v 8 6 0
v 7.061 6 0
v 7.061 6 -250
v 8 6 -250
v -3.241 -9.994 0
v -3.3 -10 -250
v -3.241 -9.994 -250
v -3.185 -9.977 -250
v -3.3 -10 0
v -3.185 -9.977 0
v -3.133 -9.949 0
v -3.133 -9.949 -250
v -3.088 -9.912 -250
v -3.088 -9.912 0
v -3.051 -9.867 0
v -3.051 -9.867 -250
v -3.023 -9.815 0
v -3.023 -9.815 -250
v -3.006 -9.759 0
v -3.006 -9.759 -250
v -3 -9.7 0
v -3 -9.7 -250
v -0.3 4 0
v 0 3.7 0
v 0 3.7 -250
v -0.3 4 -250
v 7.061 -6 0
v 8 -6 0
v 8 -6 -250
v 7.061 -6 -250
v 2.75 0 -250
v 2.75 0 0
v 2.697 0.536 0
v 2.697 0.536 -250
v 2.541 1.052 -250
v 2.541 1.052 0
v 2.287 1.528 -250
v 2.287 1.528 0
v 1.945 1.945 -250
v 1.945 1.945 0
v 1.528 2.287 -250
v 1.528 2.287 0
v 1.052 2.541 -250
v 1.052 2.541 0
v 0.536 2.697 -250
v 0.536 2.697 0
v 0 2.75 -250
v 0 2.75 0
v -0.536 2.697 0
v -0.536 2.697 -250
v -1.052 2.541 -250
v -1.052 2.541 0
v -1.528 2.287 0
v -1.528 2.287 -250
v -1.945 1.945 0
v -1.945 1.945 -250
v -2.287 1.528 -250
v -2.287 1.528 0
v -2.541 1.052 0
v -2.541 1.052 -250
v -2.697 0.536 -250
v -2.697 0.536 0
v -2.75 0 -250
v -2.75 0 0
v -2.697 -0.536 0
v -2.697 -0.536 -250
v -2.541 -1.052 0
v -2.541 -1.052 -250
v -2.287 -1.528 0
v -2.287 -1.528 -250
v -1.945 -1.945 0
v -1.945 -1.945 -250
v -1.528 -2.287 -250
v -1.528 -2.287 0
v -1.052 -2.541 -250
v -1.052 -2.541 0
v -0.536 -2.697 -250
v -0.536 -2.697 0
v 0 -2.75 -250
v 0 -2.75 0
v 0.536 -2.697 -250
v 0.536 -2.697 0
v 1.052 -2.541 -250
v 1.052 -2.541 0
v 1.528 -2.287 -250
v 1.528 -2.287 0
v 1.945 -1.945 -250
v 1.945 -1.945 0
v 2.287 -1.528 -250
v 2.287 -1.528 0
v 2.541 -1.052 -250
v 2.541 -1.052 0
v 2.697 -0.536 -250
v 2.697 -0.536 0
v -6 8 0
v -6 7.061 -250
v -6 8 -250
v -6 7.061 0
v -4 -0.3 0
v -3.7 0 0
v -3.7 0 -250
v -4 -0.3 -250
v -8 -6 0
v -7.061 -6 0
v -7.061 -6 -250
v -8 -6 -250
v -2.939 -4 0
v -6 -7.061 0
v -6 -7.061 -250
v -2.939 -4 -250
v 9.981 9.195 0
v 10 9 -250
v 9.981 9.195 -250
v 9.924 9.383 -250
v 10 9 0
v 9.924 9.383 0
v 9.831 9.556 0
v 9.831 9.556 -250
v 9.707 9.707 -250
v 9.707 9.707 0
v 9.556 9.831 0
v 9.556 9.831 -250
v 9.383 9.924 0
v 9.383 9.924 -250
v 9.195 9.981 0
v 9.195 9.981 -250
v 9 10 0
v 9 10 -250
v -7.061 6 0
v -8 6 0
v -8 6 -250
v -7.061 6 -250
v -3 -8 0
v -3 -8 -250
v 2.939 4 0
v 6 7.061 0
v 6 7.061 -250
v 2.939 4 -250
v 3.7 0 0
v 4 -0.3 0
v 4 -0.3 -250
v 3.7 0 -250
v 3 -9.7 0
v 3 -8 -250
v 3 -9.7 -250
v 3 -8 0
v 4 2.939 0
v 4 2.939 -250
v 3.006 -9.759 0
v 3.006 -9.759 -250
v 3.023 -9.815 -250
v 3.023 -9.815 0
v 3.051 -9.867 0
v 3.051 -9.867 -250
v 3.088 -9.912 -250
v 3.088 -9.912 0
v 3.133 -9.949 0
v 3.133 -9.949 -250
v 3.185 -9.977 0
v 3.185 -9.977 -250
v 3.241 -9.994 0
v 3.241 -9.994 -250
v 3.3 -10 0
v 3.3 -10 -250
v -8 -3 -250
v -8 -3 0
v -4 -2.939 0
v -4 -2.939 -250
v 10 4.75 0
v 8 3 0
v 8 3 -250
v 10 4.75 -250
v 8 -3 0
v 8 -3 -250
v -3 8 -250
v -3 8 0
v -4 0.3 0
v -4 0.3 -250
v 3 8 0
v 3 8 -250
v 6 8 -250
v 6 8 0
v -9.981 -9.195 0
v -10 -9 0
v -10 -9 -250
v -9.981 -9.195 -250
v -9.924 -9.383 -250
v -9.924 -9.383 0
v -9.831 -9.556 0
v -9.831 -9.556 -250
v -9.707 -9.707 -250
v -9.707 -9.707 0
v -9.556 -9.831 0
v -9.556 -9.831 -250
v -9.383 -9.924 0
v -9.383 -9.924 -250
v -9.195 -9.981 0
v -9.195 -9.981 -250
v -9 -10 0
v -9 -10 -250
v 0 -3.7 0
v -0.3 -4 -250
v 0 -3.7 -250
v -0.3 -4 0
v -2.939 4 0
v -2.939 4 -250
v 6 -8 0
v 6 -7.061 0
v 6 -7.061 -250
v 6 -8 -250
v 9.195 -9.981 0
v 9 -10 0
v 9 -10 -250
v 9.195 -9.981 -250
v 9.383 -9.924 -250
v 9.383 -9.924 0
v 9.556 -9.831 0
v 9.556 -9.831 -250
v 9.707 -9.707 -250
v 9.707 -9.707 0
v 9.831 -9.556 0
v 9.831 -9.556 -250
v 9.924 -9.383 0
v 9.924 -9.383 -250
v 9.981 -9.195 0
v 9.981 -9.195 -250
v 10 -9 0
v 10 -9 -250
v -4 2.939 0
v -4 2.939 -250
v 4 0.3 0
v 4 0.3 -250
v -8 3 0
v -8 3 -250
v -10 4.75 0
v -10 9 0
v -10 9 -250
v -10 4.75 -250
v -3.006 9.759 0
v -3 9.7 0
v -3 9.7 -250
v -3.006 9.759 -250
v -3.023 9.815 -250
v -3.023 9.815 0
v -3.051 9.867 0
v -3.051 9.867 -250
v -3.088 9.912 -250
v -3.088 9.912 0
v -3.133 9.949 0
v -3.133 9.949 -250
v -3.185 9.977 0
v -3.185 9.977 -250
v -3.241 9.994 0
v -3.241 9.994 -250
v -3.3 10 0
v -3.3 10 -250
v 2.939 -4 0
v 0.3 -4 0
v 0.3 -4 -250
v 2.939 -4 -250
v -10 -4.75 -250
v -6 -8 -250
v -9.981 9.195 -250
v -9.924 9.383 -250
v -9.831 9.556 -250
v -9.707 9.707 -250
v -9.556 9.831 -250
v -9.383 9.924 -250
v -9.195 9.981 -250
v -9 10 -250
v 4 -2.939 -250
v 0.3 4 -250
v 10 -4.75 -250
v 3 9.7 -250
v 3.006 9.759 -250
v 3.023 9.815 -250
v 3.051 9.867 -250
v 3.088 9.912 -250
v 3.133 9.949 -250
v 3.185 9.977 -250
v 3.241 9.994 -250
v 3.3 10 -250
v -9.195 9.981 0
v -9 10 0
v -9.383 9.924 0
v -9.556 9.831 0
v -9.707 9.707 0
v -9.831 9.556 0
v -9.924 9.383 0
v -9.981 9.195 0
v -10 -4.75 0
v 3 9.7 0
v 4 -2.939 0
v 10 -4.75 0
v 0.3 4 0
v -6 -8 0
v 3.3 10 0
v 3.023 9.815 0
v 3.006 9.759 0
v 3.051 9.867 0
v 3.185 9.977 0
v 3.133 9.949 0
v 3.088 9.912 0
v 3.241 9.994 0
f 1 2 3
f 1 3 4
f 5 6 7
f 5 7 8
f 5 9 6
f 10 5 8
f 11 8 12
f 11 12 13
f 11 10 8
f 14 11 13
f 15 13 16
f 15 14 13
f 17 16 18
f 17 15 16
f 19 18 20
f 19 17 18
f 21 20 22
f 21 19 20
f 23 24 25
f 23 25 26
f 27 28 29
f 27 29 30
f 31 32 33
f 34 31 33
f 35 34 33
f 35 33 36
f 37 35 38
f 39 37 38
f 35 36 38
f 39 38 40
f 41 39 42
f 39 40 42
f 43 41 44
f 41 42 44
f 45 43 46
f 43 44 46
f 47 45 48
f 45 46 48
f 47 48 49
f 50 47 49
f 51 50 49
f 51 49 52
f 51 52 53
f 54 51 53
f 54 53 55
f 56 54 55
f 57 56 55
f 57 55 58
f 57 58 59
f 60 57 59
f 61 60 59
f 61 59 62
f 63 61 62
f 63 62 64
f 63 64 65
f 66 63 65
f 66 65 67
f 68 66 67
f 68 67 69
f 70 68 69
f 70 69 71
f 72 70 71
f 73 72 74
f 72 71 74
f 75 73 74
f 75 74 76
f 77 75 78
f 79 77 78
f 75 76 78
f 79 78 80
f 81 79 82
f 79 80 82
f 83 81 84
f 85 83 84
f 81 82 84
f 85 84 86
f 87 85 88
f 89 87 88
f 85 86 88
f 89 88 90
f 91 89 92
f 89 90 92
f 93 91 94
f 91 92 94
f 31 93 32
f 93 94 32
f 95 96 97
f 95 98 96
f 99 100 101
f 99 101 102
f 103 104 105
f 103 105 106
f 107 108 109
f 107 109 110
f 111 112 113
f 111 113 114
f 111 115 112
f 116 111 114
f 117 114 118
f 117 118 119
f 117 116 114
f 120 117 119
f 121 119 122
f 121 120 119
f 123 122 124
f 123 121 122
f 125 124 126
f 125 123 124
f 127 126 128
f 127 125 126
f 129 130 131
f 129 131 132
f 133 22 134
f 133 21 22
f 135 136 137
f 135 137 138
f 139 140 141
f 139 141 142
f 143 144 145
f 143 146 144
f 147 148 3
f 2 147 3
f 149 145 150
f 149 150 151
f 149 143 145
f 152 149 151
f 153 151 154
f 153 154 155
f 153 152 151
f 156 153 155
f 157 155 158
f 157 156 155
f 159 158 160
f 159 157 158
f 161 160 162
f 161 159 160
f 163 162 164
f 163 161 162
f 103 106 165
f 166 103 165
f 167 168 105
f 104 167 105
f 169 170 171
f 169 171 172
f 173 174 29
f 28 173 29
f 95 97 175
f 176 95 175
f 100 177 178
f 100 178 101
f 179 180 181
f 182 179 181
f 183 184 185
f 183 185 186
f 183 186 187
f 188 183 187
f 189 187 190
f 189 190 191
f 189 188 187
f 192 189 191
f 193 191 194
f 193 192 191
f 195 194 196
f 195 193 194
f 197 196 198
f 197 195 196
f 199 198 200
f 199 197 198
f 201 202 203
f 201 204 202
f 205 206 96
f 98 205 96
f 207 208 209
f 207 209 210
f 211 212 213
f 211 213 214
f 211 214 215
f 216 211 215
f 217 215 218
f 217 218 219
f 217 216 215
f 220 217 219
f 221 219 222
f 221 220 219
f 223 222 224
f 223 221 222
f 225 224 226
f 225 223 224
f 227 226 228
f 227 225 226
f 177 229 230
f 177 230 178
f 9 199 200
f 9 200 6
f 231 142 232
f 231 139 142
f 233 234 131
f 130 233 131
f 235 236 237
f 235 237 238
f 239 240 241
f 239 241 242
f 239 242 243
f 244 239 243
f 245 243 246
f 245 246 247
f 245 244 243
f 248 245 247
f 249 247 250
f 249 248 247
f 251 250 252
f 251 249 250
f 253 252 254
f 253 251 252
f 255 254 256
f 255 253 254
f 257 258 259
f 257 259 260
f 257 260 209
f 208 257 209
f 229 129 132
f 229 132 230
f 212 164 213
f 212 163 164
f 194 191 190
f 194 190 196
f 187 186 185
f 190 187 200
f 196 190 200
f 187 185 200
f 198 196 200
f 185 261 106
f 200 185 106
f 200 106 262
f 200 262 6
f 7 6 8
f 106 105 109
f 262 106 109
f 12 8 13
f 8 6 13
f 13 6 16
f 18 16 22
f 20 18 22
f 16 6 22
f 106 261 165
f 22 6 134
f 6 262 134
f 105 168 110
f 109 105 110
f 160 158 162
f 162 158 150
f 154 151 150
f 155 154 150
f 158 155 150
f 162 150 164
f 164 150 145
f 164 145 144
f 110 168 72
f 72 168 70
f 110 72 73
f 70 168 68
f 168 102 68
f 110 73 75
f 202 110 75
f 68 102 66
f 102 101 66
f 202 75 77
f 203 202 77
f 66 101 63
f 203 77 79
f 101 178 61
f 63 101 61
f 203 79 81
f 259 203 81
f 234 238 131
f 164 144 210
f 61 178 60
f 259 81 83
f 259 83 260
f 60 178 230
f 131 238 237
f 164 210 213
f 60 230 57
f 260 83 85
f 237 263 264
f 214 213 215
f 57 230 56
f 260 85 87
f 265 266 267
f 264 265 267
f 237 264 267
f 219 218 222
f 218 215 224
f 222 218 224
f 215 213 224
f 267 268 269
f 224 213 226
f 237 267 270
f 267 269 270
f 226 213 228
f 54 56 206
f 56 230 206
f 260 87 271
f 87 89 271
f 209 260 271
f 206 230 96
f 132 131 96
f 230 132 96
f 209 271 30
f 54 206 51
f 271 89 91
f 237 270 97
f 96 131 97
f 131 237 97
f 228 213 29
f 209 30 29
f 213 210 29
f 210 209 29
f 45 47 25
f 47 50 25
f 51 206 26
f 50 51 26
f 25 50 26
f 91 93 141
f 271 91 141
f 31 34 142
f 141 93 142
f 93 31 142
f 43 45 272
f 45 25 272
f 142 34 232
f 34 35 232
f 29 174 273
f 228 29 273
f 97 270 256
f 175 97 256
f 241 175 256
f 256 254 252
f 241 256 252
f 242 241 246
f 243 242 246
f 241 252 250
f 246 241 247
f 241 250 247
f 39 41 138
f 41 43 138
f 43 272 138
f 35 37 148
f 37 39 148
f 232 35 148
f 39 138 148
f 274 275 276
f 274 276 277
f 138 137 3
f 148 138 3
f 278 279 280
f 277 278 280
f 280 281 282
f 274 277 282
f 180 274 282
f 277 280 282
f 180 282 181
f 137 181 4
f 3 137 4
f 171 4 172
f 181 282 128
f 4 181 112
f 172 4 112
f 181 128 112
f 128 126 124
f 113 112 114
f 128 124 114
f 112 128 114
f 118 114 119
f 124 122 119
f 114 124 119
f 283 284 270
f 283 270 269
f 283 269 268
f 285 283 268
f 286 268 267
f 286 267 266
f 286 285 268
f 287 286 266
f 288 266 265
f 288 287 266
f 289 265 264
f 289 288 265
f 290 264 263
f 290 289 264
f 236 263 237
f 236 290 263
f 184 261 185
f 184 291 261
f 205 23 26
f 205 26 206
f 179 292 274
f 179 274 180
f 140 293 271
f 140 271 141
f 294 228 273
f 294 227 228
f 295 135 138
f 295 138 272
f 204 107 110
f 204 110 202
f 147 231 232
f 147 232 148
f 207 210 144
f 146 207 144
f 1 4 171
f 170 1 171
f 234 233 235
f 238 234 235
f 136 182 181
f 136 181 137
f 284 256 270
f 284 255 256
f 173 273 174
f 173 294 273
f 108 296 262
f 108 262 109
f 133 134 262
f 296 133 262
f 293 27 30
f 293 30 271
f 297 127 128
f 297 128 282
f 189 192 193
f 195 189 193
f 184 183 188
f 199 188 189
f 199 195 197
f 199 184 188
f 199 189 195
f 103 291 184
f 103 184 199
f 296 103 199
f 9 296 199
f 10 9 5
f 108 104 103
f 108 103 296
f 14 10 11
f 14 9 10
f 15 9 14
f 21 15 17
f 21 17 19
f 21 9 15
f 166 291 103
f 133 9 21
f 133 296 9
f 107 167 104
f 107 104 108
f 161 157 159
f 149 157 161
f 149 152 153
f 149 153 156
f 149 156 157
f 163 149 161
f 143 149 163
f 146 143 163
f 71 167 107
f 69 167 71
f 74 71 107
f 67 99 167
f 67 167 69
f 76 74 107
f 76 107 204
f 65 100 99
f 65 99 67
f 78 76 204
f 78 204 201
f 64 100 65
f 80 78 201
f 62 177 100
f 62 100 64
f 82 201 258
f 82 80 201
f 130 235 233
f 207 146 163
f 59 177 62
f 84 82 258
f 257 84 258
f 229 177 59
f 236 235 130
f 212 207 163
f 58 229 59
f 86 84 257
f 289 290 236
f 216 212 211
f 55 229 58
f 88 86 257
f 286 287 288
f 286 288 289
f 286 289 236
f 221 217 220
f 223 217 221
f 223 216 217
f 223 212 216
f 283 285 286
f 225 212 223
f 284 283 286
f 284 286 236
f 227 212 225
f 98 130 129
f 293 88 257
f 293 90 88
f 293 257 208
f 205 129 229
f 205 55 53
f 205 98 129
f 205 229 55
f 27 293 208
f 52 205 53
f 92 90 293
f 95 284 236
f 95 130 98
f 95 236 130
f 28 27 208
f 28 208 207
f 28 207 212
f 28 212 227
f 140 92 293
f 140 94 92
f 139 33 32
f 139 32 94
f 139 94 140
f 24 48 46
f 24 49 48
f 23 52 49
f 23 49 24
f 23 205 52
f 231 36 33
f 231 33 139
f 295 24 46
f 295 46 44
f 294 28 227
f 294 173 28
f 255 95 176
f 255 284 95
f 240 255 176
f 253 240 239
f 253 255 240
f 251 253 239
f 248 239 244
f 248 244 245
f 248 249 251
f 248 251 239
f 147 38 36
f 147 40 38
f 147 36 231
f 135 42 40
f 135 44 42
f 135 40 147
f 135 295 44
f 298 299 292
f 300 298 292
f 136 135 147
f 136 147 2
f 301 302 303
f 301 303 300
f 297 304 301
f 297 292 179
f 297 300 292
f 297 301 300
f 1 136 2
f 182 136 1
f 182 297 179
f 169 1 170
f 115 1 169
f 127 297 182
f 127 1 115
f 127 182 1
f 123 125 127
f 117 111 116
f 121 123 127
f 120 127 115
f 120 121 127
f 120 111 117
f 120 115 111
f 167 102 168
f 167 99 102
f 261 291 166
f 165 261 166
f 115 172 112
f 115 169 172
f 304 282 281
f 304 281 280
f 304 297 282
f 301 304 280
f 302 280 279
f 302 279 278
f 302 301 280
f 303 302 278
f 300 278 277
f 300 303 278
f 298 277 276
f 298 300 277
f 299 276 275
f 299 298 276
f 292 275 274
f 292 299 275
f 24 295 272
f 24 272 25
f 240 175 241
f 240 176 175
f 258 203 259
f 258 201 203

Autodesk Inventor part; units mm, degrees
ref_plane "YZ Plane" through (0, 0, 0) normal (1, 0, 0) x (0, 1, 0)
ref_plane "XZ Plane" through (0, 0, 0) normal (0, 1, 0) x (-1, 0, 0)
ref_plane "XY Plane" through (0, 0, 0) normal (0, 0, 1) x (1, 0, 0)
sketch "Sketch_5" plane through (0, 0, 0) normal (0, 0, 1) x (1, 0, 0)
  line L0 (-10, 9) -> (-10, 3.3)
  arc A0 (-10, 3.3) -> (-9.7, 3) centre (-9.7, 3.3) ccw
  line L1 (-9.7, 3) -> (-8, 3)
  line L2 (-8, 3) -> (-8, 6)
  line L3 (-8, 6) -> (-7.0607, 6)
  line L4 (-7.0607, 6) -> (-4, 2.9393)
  line L5 (-4, 2.9393) -> (-4, 0.3)
  line L6 (-4, 0.3) -> (-3.7, 0)
  line L7 (-3.7, 0) -> (-4, -0.3)
  line L8 (-4, -0.3) -> (-4, -2.9393)
  line L9 (-4, -2.9393) -> (-7.0607, -6)
  line L10 (-7.0607, -6) -> (-8, -6)
  line L11 (-8, -6) -> (-8, -3)
  line L12 (-8, -3) -> (-9.7, -3)
  arc A1 (-9.7, -3) -> (-10, -3.3) centre (-9.7, -3.3) ccw
  line L13 (-10, -3.3) -> (-10, -9)
  arc A2 (-10, -9) -> (-9, -10) centre (-9, -9) ccw
  line L14 (-9, -10) -> (-3.3, -10)
  arc A3 (-3.3, -10) -> (-3, -9.7) centre (-3.3, -9.7) ccw
  line L15 (-3, -9.7) -> (-3, -8)
  line L16 (-3, -8) -> (-6, -8)
  line L17 (-6, -8) -> (-6, -7.0607)
  line L18 (-6, -7.0607) -> (-2.9393, -4)
  line L19 (-2.9393, -4) -> (-0.3, -4)
  line L20 (-0.3, -4) -> (0, -3.7)
  line L21 (0, -3.7) -> (0.3, -4)
  line L22 (0.3, -4) -> (2.9393, -4)
  line L23 (2.9393, -4) -> (6, -7.0607)
  line L24 (6, -7.0607) -> (6, -8)
  line L25 (6, -8) -> (3, -8)
  line L26 (3, -8) -> (3, -9.7)
  arc A4 (3, -9.7) -> (3.3, -10) centre (3.3, -9.7) ccw
  line L27 (3.3, -10) -> (9, -10)
  arc A5 (9, -10) -> (10, -9) centre (9, -9) ccw
  line L28 (10, -9) -> (10, -3.3)
  arc A6 (10, -3.3) -> (9.7, -3) centre (9.7, -3.3) ccw
  line L29 (9.7, -3) -> (8, -3)
  line L30 (8, -3) -> (8, -6)
  line L31 (8, -6) -> (7.0607, -6)
  line L32 (7.0607, -6) -> (4, -2.9393)
  line L33 (4, -2.9393) -> (4, -0.3)
  line L34 (4, -0.3) -> (3.7, 0)
  line L35 (3.7, 0) -> (4, 0.3)
  line L36 (4, 0.3) -> (4, 2.9393)
  line L37 (4, 2.9393) -> (7.0607, 6)
  line L38 (7.0607, 6) -> (8, 6)
  line L39 (8, 6) -> (8, 3)
  line L40 (8, 3) -> (9.7, 3)
  arc A7 (9.7, 3) -> (10, 3.3) centre (9.7, 3.3) ccw
  line L41 (10, 3.3) -> (10, 9)
  arc A8 (10, 9) -> (9, 10) centre (9, 9) ccw
  line L42 (9, 10) -> (3.3, 10)
  arc A9 (3.3, 10) -> (3, 9.7) centre (3.3, 9.7) ccw
  line L43 (3, 9.7) -> (3, 8)
  line L44 (3, 8) -> (6, 8)
  line L45 (6, 8) -> (6, 7.0607)
  line L46 (6, 7.0607) -> (2.9393, 4)
  line L47 (2.9393, 4) -> (0.3, 4)
  line L48 (0.3, 4) -> (0, 3.7)
  line L49 (0, 3.7) -> (-0.3, 4)
  line L50 (-0.3, 4) -> (-2.9393, 4)
  line L51 (-2.9393, 4) -> (-6, 7.0607)
  line L52 (-6, 7.0607) -> (-6, 8)
  line L53 (-6, 8) -> (-3, 8)
  line L54 (-3, 8) -> (-3, 9.7)
  arc A10 (-3, 9.7) -> (-3.3, 10) centre (-3.3, 9.7) ccw
  line L55 (-3.3, 10) -> (-9, 10)
  arc A11 (-9, 10) -> (-10, 9) centre (-9, 9) ccw
  circle A12 centre (0, 0) radius 2.75
  line L56 (-8, 3) -> (-10, 4.75)
  line L57 (-10, -4.75) -> (-8, -3)
  line L58 (8, 3) -> (10, 4.75)
  line L59 (10, -4.75) -> (8, -3)
  dimension "d2" = 5.5
  dimension "d3" = 10
  dimension "d4" = 10
  dimension "d5" = 5.7
  dimension "d6" = 5.7
  dimension "d7" = 1.7
  dimension "d8" = 3
  dimension "d9" = 0.3
  dimension "d10" = 90
  dimension "d11" = 45
  dimension "d12" = 45
  dimension "d13" = 45
  dimension "d14" = 90
  dimension "d15" = 90
  dimension "d16" = 45
  dimension "d17" = 45
  dimension "d18" = 45
  dimension "d19" = 45
  dimension "d20" = 90
  dimension "d21" = 90
  dimension "d22" = 45
  dimension "d23" = 45
  dimension "d24" = 90
  dimension "d25" = 90
  dimension "d26" = 90
  dimension "d27" = 90
  dimension "d28" = 90
  dimension "d29" = 90
  dimension "d30" = 90
  dimension "d31" = 90
  dimension "d32" = 90
  dimension "d33" = 90
  dimension "d34" = 90
  dimension "d35" = 90
  dimension "d36" = 90
  dimension "d37" = 90
  dimension "d38" = 90
  dimension "d39" = 4
  dimension "d40" = 6
  dimension "d41" = 13
  dimension "d42" = 14
  dimension "d43" = 16
  dimension "d44" = 18
  dimension "d45" = 3
  dimension "d46" = 9
  dimension "d47" = 7
  dimension "d48" = 1
  dimension "d49" = 7
  dimension "d50" = 1.5
  dimension "d51" = 1.8663
  dimension "d52" = 3.3663
  dimension "d53" = 1.5
  dimension "d54" = 1.8663
  dimension "d55" = 3.3663
  dimension "d56" = 4
  dimension "d57" = 10.8187
  dimension "d58" = 1.9092
  dimension "d59" = 5
  dimension "d60" = 13
  dimension "d61" = 13
  dimension "d62" = 16.0513
  dimension "d63" = 3.3234
  dimension "d64" = 14
  dimension "d65" = 12.685
extrude "Extrusion1" add sketch "Sketch_5" against normal blind 250 contours A11 L55 A10 L54 L53 L52 L51 L50 L49 L48 L47 L46 L45 L44 L43 A9 L42 A8 L41 L58 L39 L38 L37 L36 L35 L34 L33 L32 L31 L30 L59 L28 A5 L27 A4 L26 L25 L24 L23 L22 L21 L20 L19 L18 L17 L16 L15 A3 L14 A2 L13 L57 L11 L10 L9 L8 L7 L6 L5 L4 L3 L2 L56 L0
properties part number "Perfil_Aluminio_20x20"
